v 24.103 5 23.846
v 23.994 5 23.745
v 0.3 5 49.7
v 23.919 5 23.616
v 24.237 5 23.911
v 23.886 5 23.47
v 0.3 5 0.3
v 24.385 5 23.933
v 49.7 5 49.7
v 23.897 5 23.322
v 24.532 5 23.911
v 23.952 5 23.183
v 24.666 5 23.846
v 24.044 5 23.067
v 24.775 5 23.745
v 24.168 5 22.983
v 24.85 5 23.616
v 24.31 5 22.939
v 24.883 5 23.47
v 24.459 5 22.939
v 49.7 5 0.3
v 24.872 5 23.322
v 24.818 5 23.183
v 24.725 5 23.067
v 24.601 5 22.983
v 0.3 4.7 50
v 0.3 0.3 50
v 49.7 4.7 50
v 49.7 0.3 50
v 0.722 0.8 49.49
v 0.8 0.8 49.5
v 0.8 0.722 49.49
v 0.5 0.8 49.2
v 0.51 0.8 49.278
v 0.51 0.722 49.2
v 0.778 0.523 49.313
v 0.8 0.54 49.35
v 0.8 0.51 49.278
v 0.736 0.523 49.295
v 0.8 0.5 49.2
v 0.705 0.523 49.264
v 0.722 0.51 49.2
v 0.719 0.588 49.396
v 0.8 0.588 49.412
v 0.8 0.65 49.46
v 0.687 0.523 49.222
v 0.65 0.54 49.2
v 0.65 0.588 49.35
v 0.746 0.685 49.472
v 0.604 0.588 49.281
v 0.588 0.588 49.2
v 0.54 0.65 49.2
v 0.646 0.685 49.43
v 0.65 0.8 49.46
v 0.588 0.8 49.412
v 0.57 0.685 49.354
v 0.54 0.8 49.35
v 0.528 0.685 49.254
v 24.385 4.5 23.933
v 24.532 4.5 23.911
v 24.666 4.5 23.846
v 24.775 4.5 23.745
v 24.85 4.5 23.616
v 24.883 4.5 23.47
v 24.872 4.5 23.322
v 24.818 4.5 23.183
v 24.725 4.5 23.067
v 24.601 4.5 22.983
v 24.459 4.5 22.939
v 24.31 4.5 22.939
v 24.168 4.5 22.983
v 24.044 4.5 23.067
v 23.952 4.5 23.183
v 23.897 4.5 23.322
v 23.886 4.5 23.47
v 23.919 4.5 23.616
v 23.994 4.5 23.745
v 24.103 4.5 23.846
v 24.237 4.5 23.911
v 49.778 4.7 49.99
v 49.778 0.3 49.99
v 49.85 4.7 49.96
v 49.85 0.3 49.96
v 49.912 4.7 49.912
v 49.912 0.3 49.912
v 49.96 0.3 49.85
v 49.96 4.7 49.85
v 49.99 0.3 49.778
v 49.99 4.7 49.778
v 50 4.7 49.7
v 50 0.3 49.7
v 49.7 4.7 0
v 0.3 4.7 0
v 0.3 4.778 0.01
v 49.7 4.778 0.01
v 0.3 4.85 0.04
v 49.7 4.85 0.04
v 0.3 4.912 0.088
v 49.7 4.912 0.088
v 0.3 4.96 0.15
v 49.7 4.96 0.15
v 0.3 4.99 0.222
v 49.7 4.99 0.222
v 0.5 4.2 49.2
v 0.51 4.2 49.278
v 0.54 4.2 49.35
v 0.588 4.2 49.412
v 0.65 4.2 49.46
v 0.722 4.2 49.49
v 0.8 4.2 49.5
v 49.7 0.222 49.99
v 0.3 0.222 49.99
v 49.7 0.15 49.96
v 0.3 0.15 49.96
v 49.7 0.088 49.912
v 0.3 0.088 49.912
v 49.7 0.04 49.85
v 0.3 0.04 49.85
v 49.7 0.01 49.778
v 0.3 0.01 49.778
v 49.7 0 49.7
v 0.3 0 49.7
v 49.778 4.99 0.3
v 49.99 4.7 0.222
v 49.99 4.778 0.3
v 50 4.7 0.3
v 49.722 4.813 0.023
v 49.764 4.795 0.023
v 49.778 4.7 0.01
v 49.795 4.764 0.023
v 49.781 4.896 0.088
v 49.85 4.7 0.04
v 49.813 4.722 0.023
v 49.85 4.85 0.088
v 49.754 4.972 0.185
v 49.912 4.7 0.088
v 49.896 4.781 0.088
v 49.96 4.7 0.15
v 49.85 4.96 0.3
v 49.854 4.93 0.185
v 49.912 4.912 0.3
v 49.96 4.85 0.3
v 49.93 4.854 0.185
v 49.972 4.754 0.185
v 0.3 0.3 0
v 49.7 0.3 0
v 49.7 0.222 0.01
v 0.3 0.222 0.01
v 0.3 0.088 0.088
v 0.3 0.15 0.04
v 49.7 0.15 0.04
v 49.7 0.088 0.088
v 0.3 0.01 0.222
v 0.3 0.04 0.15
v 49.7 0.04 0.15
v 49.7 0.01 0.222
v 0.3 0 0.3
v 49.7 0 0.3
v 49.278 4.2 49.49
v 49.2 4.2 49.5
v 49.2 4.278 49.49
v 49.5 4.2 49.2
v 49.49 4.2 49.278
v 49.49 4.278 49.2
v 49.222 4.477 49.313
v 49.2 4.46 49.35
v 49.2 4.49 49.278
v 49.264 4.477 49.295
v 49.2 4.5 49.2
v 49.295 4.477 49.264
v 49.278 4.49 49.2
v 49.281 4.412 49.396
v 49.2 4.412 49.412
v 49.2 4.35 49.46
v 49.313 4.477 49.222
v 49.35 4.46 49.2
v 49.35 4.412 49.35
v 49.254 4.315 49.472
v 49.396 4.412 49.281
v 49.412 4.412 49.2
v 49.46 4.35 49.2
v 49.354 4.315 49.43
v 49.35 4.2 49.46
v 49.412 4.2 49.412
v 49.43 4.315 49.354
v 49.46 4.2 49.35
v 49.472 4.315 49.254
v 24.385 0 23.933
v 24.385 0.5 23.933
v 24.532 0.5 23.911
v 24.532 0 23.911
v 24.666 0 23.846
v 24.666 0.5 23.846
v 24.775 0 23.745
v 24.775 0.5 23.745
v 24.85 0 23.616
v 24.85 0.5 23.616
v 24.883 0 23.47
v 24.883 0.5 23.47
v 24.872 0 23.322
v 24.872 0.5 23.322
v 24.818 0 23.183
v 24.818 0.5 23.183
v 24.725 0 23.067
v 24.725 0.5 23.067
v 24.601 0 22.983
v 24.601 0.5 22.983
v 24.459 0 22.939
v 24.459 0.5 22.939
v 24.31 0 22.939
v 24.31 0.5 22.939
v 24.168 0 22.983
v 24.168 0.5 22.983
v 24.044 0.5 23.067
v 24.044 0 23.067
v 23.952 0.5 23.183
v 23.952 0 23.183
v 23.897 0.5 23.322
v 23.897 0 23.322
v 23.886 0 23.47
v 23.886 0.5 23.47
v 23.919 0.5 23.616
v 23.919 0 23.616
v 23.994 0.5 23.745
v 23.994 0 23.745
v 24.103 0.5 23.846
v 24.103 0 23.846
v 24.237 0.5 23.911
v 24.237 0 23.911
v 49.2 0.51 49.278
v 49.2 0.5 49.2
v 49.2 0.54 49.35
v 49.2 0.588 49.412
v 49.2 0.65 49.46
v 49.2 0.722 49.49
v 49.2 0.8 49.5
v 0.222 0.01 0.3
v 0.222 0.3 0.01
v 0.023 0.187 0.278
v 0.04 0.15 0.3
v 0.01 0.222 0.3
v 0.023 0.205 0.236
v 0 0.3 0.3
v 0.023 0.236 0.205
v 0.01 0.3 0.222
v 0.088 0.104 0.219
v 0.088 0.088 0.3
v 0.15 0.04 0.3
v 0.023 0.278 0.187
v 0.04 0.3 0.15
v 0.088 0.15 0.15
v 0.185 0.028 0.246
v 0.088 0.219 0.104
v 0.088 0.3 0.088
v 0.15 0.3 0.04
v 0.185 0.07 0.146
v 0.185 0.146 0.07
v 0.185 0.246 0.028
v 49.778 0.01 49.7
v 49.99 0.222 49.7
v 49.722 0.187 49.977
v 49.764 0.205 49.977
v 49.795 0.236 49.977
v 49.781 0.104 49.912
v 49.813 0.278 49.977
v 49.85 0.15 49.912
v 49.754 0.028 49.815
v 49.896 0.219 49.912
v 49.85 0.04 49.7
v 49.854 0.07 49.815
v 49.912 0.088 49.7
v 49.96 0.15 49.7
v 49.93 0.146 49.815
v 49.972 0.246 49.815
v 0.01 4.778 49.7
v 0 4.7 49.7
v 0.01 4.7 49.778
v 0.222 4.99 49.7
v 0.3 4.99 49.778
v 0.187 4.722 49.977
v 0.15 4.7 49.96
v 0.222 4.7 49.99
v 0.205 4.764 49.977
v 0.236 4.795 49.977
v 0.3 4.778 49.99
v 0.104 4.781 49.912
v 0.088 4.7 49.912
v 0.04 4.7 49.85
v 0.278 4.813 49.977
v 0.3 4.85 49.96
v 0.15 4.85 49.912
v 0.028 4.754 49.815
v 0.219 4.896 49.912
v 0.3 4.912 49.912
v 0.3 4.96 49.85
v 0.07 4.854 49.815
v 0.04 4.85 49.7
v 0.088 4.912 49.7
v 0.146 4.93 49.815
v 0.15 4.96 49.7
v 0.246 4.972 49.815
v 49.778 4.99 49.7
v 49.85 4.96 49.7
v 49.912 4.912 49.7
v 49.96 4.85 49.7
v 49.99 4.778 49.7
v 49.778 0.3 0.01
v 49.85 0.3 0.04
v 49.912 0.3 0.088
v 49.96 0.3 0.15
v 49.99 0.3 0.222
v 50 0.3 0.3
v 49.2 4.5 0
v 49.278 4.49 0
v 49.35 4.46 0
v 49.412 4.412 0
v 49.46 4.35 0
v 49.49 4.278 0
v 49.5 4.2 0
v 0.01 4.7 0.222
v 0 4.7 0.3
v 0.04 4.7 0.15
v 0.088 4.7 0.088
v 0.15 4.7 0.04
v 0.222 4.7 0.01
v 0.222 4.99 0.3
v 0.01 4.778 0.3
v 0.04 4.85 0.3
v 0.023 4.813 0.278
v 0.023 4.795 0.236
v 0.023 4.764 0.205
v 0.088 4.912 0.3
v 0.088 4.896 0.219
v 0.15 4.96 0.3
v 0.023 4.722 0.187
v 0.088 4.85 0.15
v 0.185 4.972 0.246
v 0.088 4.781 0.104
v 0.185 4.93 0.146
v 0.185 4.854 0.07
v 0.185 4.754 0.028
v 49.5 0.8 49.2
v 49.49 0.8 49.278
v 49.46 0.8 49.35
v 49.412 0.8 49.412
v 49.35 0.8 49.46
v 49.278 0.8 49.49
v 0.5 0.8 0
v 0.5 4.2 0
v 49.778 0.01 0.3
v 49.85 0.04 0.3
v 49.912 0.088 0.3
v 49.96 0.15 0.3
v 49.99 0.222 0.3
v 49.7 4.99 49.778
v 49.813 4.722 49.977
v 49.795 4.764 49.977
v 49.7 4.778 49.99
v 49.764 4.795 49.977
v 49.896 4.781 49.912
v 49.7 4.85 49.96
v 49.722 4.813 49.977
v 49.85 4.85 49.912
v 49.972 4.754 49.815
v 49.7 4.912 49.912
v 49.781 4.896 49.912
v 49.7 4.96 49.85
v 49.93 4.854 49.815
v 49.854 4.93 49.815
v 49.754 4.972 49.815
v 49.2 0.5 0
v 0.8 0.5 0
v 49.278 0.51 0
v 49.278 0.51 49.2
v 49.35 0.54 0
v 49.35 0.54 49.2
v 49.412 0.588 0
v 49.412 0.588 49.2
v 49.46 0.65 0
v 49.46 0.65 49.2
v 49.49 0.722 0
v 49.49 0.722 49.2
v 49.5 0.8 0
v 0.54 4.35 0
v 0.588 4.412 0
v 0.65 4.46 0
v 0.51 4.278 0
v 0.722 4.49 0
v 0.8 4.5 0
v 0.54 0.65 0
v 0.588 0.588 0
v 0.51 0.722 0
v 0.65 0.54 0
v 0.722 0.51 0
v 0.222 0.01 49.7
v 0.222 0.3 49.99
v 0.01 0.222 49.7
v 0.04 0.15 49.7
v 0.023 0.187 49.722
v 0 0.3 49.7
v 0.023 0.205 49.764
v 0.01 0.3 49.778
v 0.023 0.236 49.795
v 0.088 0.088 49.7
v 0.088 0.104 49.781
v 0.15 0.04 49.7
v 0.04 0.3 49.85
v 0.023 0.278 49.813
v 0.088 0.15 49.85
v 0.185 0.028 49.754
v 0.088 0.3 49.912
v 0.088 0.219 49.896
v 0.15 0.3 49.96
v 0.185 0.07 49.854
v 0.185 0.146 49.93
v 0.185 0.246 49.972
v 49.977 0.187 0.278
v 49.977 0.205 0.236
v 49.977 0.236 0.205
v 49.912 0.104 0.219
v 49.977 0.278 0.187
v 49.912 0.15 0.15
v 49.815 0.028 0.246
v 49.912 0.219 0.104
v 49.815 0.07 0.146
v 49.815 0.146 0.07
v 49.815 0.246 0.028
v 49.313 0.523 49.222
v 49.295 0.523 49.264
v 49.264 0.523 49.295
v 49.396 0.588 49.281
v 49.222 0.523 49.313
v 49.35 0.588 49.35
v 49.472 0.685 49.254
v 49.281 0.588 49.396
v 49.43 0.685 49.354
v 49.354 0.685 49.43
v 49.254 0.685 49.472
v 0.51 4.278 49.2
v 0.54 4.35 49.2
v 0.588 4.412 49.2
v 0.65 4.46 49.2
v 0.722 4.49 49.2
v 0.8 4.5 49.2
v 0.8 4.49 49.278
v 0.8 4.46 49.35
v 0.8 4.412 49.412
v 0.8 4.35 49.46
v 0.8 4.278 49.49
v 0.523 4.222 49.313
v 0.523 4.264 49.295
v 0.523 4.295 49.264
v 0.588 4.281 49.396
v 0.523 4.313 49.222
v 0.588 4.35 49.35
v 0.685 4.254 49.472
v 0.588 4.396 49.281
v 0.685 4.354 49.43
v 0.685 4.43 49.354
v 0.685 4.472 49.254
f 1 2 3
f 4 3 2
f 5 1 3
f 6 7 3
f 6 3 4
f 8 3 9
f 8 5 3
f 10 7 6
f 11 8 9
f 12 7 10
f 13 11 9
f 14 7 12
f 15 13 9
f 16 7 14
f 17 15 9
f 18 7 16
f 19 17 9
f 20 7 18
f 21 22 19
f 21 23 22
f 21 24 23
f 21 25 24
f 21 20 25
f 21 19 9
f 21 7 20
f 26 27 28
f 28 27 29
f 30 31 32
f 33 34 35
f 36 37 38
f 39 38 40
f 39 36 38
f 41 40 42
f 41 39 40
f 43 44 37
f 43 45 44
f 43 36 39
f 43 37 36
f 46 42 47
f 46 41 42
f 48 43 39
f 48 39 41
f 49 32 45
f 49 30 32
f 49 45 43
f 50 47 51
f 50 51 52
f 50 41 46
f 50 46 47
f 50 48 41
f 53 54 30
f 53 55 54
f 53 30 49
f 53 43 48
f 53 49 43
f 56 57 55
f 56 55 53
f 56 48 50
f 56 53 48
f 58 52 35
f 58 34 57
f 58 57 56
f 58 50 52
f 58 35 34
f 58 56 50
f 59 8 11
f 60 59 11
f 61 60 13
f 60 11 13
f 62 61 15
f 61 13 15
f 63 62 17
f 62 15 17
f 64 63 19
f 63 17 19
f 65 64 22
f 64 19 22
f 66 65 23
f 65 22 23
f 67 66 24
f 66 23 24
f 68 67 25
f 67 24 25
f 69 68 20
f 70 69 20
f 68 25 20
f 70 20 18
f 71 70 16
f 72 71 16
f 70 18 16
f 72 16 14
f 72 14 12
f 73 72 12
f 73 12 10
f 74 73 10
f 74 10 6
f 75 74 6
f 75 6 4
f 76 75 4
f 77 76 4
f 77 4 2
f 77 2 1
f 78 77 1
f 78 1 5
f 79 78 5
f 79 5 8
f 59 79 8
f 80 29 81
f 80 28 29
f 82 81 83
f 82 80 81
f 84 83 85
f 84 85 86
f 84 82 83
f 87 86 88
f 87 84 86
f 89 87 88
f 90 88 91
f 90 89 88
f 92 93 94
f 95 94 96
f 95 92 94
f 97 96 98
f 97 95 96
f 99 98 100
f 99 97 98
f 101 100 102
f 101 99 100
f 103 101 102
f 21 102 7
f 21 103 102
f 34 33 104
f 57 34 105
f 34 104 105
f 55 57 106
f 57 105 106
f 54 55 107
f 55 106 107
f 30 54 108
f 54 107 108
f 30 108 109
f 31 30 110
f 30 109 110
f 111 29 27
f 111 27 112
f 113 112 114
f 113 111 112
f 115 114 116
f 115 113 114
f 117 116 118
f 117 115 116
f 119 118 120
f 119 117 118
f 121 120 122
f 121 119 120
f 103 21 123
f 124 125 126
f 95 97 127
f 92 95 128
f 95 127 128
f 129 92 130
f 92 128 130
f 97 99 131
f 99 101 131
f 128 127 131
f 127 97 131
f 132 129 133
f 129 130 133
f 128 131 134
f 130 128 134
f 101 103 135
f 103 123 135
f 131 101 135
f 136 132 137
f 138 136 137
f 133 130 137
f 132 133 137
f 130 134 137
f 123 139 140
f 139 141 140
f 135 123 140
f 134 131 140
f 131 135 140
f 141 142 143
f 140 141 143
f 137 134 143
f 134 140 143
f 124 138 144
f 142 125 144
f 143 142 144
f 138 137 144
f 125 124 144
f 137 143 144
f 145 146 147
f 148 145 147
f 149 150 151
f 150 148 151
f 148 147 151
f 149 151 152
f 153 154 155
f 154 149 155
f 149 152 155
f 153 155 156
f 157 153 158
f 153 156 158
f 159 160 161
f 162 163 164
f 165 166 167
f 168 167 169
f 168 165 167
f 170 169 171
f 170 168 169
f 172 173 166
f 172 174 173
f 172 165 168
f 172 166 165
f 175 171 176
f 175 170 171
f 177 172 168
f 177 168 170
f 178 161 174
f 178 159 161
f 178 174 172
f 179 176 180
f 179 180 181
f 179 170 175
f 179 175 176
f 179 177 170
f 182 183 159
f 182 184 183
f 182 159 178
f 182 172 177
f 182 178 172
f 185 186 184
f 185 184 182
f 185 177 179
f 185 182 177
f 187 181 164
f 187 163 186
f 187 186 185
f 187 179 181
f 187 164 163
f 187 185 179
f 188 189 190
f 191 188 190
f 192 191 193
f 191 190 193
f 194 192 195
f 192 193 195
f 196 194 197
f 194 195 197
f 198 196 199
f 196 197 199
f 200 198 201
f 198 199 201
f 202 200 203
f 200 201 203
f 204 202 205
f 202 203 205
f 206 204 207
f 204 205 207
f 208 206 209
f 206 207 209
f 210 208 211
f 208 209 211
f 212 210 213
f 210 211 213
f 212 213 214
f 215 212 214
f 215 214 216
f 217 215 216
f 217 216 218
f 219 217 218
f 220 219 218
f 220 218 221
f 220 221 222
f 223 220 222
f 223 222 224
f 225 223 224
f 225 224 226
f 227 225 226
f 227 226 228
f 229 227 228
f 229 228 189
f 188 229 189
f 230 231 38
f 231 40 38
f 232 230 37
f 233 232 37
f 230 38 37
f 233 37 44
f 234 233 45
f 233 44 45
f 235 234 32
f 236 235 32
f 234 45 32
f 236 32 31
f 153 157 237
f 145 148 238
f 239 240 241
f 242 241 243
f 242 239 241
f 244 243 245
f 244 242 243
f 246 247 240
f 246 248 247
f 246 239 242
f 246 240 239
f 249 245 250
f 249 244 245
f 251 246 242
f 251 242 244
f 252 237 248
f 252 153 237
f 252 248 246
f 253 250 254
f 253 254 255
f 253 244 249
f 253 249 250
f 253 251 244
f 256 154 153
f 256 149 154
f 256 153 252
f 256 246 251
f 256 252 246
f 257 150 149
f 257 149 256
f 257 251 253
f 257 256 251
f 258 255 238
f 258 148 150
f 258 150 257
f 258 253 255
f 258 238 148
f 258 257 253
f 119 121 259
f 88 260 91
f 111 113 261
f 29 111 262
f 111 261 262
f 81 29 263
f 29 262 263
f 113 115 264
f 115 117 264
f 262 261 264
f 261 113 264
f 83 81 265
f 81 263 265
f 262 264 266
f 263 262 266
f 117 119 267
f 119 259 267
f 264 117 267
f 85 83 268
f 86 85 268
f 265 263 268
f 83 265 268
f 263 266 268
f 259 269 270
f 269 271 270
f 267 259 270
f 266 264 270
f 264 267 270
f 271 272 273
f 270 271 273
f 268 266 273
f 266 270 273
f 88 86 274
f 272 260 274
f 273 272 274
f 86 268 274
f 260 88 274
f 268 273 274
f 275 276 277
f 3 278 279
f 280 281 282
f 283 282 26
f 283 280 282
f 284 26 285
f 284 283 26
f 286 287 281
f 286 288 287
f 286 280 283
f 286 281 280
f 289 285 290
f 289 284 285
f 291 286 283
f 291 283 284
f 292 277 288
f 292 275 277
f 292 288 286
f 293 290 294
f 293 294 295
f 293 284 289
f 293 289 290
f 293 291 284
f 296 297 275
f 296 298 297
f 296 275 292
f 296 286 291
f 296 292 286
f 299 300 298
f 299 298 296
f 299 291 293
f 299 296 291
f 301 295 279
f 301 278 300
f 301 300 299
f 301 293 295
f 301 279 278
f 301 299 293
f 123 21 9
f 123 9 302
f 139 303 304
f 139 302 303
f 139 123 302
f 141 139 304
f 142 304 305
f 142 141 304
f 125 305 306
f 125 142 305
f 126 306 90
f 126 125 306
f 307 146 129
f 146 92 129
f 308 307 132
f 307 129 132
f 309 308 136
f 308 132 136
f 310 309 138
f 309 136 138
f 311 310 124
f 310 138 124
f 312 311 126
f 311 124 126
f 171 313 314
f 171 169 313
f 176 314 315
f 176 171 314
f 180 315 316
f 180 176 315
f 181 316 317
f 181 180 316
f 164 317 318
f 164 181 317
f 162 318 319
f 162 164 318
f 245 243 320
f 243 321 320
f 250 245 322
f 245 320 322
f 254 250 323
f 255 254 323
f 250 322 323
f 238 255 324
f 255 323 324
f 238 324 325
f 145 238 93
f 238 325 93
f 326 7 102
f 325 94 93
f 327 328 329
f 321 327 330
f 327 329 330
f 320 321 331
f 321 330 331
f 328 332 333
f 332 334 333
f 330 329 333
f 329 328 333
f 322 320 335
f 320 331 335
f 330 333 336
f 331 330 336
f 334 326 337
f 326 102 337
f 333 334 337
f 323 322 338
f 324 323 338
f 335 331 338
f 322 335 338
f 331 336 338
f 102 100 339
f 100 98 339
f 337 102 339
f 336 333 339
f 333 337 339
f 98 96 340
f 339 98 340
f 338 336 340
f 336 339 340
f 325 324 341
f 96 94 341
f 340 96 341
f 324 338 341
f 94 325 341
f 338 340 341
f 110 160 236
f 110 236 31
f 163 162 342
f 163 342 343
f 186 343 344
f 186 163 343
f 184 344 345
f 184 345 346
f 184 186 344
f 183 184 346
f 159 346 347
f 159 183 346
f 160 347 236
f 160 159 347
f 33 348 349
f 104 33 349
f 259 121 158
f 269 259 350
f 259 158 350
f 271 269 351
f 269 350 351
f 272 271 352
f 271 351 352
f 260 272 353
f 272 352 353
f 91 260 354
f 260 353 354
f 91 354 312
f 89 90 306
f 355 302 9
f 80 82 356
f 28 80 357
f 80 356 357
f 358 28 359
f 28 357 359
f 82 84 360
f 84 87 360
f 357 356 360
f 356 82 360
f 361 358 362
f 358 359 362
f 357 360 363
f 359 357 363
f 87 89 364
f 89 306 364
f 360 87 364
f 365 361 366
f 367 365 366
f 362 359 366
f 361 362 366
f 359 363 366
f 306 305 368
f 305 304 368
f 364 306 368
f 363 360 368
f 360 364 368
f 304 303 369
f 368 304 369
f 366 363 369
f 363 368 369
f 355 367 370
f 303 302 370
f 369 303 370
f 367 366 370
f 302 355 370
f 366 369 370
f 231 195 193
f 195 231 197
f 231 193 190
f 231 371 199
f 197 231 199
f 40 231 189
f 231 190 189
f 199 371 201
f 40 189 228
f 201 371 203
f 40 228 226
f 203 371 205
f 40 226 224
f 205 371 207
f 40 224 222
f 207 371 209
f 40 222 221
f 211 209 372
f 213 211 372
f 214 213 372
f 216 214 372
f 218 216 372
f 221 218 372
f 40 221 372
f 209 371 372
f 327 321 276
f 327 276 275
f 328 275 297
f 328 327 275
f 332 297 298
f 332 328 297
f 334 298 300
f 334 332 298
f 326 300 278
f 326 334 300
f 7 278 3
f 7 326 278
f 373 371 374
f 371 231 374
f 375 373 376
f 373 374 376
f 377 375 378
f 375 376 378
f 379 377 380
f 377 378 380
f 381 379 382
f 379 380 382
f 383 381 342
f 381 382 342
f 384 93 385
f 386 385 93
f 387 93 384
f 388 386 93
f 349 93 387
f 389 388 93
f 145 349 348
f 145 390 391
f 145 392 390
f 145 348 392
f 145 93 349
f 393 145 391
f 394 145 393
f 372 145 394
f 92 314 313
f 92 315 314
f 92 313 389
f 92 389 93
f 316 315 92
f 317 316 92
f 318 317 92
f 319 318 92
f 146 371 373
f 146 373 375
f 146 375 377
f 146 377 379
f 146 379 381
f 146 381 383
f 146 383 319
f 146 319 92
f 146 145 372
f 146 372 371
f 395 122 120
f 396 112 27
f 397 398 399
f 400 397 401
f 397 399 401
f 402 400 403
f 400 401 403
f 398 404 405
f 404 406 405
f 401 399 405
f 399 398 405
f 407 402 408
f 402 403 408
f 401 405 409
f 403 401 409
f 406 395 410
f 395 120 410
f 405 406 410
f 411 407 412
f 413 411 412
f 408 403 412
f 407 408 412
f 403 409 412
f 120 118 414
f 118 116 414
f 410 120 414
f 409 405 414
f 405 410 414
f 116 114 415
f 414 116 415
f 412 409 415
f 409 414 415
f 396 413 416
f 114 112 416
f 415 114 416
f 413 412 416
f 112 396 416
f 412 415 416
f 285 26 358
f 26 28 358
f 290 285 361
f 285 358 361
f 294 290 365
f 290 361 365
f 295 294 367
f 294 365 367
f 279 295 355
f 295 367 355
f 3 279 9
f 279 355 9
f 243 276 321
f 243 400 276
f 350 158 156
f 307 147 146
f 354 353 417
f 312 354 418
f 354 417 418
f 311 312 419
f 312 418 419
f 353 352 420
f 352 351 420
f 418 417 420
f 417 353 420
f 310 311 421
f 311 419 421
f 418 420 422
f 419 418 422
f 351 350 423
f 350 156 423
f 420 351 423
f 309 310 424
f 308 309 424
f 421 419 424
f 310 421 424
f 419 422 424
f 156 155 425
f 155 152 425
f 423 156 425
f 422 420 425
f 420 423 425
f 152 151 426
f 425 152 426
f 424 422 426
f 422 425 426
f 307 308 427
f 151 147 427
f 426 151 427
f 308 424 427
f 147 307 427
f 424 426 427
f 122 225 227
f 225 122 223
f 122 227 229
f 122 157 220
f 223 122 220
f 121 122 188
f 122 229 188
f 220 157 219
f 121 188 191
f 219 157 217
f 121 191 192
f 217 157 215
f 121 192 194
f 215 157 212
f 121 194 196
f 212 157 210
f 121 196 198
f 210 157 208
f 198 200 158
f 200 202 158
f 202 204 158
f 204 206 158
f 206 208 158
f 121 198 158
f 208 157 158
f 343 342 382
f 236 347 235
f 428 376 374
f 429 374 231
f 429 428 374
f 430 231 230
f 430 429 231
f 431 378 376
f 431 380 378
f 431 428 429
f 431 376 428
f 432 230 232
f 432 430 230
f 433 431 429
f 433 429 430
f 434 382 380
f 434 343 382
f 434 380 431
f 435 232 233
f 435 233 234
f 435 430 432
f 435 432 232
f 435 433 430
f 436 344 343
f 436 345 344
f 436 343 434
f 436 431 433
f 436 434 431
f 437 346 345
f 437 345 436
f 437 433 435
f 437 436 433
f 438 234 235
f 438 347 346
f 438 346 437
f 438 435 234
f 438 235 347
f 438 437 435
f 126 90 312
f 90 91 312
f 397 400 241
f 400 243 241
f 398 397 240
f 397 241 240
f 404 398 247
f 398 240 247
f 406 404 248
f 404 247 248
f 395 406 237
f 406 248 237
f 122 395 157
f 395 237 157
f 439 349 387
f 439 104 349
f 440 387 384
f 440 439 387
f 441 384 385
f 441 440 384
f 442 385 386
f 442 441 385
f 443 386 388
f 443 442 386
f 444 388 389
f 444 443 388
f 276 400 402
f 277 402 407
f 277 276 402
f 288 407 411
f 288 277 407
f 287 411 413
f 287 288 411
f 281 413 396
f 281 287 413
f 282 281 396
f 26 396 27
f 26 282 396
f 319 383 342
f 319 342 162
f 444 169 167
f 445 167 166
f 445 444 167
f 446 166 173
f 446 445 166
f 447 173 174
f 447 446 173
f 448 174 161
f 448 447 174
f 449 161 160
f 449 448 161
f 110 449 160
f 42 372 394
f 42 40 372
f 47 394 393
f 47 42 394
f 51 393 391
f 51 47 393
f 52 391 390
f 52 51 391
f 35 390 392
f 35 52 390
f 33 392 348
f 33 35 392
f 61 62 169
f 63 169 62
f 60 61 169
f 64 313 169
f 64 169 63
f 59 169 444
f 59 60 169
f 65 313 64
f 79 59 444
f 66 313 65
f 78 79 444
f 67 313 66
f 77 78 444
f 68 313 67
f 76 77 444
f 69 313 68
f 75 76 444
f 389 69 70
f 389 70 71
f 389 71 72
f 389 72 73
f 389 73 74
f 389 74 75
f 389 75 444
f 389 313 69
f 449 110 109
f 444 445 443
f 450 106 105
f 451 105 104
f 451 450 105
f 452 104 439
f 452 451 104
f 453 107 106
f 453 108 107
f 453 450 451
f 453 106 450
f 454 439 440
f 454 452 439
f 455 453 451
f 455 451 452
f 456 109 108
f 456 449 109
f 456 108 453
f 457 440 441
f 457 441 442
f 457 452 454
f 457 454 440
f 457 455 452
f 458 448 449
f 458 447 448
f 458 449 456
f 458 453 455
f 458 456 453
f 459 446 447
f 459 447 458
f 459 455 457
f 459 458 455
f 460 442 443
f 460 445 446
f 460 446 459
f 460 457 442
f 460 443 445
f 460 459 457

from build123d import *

# Parameters (mm, degrees)
SKETCH1_W           = 50
SKETCH1_H           = 50
BOSS_EXTRUDE1_DEPTH = 5
SKETCH2_W           = 49
SKETCH2_H           = 4
CUT_EXTRUDE1_DEPTH  = 49.5
SKETCH3_R           = 0.5
CUT_EXTRUDE2_DEPTH  = 71.887234394
FILLET6_R           = 0.3


with BuildPart() as part:
    # Sketch1 → Boss-Extrude1 (new body)
    with BuildSketch(Plane(origin=(0, 0, 0), x_dir=(1, 0, 0), z_dir=(0, 1, 0))):
        with Locations((25, -25)):
            Rectangle(SKETCH1_W, SKETCH1_H)
    extrude(amount=BOSS_EXTRUDE1_DEPTH)

    # Sketch2 → Cut-Extrude1 (cut)
    with BuildSketch(Plane(origin=(0, 0, 0), x_dir=(-1, 0, 0), z_dir=(0, 0, -1))):
        with Locations((-25, 2.5)):
            Rectangle(SKETCH2_W, SKETCH2_H)
    extrude(amount=-CUT_EXTRUDE1_DEPTH, mode=Mode.SUBTRACT)

    # Sketch3 → Cut-Extrude2 (cut, through all)
    with BuildSketch(Plane(origin=(0, 5, 0), x_dir=(1, 0, 0), z_dir=(0, 1, 0))):
        with Locations(Location((24.38451422, -23.433057304, 0), (0, 0, 270))):
            Circle(SKETCH3_R)
    extrude(amount=-CUT_EXTRUDE2_DEPTH, mode=Mode.SUBTRACT)

    # Fillet6
    fillet6_edges = [part.edges().sort_by_distance(p)[0] for p in [
        (50, 5, 25),
        (49.5, 2.5, 49.5),
        (25, 5, 0),
        (49.5, 0.5, 24.75),
        (25, 4.5, 49.5),
        (49.5, 4.5, 24.75),
        (0.5, 2.5, 49.5),
        (0.5, 4.5, 24.75),
        (25, 0.5, 49.5),
        (0.5, 0.5, 24.75),
        (0, 5, 25),
        (25, 0, 0),
        (50, 0, 25),
        (25, 0, 50),
        (0, 0, 25),
        (0, 2.5, 0),
        (50, 2.5, 0),
        (50, 2.5, 50),
        (0, 2.5, 50),
        (25, 5, 50),
    ]]
    fillet(fillet6_edges, radius=FILLET6_R)


solid = part.part
